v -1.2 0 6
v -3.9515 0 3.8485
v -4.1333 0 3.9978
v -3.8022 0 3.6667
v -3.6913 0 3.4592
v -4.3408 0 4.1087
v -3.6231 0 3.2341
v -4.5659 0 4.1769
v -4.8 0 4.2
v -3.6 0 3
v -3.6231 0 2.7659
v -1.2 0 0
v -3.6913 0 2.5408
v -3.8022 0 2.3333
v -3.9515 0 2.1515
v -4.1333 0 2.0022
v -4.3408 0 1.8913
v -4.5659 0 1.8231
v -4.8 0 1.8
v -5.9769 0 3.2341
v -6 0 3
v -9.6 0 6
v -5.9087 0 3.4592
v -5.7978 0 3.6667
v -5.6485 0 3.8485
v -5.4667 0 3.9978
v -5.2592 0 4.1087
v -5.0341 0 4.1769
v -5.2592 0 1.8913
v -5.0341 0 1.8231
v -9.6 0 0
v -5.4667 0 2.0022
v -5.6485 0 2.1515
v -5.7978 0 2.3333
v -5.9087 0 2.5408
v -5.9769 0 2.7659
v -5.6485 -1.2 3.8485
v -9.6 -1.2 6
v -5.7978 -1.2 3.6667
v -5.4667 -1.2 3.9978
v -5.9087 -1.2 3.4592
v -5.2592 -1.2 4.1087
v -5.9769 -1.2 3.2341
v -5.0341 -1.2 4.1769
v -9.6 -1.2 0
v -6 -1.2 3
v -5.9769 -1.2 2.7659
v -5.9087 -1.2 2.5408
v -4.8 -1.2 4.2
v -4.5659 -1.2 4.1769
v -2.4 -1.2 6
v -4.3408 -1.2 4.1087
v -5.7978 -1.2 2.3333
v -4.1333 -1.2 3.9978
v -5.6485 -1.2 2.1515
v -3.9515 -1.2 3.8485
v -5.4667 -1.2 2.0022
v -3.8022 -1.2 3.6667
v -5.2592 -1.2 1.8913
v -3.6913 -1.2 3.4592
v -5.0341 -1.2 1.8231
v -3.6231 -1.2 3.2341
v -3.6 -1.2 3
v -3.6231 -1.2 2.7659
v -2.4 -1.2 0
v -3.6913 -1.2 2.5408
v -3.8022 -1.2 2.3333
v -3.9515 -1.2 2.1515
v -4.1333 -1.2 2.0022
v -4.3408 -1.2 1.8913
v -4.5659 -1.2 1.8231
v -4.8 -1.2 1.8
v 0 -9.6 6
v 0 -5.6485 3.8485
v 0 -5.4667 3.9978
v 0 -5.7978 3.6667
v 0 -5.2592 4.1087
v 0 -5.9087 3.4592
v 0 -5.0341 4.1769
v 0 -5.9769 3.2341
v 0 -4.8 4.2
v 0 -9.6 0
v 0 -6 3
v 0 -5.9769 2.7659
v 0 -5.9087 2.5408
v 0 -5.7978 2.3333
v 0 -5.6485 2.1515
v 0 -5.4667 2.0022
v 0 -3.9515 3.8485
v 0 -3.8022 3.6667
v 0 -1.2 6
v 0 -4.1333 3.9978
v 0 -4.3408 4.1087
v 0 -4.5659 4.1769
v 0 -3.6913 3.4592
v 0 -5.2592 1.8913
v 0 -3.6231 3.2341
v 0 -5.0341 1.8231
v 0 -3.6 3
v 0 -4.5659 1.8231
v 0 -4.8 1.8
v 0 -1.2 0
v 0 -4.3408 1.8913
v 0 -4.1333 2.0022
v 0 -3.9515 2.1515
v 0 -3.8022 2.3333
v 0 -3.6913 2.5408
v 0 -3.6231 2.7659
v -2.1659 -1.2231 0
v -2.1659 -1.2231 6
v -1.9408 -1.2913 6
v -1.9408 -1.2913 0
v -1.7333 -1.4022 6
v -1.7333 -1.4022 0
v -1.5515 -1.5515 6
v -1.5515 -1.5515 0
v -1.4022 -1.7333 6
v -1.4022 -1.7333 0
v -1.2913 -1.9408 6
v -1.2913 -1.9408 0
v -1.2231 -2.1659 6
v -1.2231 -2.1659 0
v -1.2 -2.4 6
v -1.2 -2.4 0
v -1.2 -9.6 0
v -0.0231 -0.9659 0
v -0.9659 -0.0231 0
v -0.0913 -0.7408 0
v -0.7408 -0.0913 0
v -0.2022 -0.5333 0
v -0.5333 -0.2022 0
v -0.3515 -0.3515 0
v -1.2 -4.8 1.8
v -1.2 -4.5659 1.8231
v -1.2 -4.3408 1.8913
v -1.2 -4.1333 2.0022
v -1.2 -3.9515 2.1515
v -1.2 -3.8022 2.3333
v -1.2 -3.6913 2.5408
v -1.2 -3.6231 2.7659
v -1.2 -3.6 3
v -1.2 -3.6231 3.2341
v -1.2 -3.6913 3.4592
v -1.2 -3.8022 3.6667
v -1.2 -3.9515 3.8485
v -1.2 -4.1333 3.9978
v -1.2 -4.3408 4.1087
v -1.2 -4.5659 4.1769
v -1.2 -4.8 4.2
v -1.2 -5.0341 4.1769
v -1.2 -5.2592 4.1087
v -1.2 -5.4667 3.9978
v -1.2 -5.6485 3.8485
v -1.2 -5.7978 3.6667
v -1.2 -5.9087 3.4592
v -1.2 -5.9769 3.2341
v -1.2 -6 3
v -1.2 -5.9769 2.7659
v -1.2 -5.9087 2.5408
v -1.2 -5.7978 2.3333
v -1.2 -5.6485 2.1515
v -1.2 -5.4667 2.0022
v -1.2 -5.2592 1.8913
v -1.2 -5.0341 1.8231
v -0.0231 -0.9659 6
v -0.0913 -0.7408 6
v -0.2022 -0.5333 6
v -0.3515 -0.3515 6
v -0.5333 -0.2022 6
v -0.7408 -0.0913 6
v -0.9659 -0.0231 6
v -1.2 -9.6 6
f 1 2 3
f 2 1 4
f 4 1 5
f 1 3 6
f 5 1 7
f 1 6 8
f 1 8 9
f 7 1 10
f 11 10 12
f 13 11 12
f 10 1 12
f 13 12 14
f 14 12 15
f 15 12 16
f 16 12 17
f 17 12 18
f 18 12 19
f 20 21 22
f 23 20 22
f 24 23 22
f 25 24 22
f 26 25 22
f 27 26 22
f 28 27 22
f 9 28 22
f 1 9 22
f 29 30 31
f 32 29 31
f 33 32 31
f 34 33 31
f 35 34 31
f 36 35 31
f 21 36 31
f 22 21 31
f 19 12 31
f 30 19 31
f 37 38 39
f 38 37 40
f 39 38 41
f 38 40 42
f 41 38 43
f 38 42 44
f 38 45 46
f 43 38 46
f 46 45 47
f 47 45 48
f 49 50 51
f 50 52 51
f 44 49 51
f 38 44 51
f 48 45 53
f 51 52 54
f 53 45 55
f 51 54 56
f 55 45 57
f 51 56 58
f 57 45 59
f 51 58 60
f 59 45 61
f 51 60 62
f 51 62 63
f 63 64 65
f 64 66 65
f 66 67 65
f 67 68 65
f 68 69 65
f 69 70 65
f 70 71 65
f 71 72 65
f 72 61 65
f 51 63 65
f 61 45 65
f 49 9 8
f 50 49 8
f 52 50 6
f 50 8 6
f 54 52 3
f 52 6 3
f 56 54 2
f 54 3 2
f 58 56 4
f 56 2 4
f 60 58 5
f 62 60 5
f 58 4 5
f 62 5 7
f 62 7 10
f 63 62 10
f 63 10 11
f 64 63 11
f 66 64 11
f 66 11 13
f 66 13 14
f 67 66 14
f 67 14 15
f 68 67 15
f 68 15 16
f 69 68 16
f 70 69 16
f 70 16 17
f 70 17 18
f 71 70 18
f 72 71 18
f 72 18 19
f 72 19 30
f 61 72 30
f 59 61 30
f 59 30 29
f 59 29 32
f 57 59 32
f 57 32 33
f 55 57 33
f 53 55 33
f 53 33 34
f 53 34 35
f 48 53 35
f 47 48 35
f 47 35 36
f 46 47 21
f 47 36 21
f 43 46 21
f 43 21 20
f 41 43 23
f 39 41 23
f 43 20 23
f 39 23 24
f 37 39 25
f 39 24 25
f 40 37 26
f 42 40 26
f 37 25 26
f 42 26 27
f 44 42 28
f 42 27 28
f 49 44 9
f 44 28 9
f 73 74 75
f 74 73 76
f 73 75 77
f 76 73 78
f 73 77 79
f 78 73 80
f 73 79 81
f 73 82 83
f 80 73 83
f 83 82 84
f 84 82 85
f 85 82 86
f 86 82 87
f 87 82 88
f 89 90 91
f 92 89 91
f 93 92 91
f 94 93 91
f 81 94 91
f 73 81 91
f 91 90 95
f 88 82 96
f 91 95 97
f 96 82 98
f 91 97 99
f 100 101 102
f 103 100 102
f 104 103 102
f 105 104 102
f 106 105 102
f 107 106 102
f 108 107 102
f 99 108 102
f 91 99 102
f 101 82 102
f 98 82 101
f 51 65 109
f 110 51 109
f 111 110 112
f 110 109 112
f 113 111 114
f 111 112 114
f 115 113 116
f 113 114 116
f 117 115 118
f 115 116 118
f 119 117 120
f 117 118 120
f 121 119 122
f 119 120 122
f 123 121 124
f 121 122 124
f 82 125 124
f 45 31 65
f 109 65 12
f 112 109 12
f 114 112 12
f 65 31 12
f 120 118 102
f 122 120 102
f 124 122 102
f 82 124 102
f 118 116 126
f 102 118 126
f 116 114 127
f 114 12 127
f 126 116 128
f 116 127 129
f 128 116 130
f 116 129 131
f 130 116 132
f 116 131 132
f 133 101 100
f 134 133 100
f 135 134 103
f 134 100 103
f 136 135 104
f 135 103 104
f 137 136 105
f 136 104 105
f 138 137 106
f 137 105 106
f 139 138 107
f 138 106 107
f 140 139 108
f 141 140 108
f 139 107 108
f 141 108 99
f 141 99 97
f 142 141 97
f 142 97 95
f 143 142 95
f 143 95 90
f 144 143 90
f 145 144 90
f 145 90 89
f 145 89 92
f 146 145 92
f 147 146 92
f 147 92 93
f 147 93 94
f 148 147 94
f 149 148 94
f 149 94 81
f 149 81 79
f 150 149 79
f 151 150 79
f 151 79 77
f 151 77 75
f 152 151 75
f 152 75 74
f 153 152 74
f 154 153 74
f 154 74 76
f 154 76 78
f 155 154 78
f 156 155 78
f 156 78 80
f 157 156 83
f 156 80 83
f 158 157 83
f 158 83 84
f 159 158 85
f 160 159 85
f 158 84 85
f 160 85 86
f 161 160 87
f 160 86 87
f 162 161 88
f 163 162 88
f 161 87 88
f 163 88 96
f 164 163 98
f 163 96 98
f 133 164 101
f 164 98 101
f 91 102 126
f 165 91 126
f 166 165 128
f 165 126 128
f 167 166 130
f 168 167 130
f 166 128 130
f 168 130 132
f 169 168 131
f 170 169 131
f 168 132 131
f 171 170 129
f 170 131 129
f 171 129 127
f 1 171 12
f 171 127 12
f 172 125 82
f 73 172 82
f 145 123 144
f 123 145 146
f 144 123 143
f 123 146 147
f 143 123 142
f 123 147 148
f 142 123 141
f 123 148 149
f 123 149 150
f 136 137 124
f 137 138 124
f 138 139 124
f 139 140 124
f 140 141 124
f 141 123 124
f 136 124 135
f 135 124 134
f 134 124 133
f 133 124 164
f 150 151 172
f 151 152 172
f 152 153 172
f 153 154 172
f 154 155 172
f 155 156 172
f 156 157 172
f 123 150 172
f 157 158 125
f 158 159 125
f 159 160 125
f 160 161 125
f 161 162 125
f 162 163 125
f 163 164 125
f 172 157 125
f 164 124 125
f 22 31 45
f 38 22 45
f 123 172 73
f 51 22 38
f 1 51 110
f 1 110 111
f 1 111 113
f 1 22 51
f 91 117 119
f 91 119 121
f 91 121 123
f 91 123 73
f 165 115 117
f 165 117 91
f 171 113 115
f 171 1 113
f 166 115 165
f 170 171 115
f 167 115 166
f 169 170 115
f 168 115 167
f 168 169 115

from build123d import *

# Parameters (mm, degrees)
BOSS_EXTRU_2_DEPTH      = 6
ESQUISSE3_R             = 1.2
ENL_V_MAT_EXTRU_1_DEPTH = 6
ESQUISSE4_R             = 1.2
ENL_V_MAT_EXTRU_2_DEPTH = 6


with BuildPart() as part:
    # Esquisse2 → Boss.-Extru.2 (new body)
    with BuildSketch(Plane.XY):
        with BuildLine():
            Line((-1.2, 0), (-9.6, 0))
            Line((-9.6, 0), (-9.6, -1.2))
            Line((-9.6, -1.2), (-2.4, -1.2))
            ThreePointArc((-2.4, -1.2), (-1.551471863, -1.551471863), (-1.2, -2.4))
            Line((-1.2, -2.4), (-1.2, -9.6))
            Line((-1.2, -9.6), (0, -9.6))
            Line((0, -9.6), (0, -1.2))
            ThreePointArc((0, -1.2), (-0.351471863, -0.351471863), (-1.2, 0))
        make_face()
    extrude(amount=BOSS_EXTRU_2_DEPTH)

    # Esquisse3 → Enlèv. mat.-Extru.1 (cut)
    with BuildSketch(Plane(origin=(0, 0, 0), x_dir=(1, 0, 0), z_dir=(0, 1, 0))):
        with Locations(Location((-4.8, -3, 0), (0, 0, 270))):
            Circle(ESQUISSE3_R)
    extrude(amount=-ENL_V_MAT_EXTRU_1_DEPTH, mode=Mode.SUBTRACT)

    # Esquisse4 → Enlèv. mat.-Extru.2 (cut)
    with BuildSketch(Plane(origin=(0, 0, 0), x_dir=(0, 0, -1), z_dir=(1, 0, 0))):
        with Locations((-3, -4.8)):
            Circle(ESQUISSE4_R)
    extrude(amount=-ENL_V_MAT_EXTRU_2_DEPTH, mode=Mode.SUBTRACT)


solid = part.part
